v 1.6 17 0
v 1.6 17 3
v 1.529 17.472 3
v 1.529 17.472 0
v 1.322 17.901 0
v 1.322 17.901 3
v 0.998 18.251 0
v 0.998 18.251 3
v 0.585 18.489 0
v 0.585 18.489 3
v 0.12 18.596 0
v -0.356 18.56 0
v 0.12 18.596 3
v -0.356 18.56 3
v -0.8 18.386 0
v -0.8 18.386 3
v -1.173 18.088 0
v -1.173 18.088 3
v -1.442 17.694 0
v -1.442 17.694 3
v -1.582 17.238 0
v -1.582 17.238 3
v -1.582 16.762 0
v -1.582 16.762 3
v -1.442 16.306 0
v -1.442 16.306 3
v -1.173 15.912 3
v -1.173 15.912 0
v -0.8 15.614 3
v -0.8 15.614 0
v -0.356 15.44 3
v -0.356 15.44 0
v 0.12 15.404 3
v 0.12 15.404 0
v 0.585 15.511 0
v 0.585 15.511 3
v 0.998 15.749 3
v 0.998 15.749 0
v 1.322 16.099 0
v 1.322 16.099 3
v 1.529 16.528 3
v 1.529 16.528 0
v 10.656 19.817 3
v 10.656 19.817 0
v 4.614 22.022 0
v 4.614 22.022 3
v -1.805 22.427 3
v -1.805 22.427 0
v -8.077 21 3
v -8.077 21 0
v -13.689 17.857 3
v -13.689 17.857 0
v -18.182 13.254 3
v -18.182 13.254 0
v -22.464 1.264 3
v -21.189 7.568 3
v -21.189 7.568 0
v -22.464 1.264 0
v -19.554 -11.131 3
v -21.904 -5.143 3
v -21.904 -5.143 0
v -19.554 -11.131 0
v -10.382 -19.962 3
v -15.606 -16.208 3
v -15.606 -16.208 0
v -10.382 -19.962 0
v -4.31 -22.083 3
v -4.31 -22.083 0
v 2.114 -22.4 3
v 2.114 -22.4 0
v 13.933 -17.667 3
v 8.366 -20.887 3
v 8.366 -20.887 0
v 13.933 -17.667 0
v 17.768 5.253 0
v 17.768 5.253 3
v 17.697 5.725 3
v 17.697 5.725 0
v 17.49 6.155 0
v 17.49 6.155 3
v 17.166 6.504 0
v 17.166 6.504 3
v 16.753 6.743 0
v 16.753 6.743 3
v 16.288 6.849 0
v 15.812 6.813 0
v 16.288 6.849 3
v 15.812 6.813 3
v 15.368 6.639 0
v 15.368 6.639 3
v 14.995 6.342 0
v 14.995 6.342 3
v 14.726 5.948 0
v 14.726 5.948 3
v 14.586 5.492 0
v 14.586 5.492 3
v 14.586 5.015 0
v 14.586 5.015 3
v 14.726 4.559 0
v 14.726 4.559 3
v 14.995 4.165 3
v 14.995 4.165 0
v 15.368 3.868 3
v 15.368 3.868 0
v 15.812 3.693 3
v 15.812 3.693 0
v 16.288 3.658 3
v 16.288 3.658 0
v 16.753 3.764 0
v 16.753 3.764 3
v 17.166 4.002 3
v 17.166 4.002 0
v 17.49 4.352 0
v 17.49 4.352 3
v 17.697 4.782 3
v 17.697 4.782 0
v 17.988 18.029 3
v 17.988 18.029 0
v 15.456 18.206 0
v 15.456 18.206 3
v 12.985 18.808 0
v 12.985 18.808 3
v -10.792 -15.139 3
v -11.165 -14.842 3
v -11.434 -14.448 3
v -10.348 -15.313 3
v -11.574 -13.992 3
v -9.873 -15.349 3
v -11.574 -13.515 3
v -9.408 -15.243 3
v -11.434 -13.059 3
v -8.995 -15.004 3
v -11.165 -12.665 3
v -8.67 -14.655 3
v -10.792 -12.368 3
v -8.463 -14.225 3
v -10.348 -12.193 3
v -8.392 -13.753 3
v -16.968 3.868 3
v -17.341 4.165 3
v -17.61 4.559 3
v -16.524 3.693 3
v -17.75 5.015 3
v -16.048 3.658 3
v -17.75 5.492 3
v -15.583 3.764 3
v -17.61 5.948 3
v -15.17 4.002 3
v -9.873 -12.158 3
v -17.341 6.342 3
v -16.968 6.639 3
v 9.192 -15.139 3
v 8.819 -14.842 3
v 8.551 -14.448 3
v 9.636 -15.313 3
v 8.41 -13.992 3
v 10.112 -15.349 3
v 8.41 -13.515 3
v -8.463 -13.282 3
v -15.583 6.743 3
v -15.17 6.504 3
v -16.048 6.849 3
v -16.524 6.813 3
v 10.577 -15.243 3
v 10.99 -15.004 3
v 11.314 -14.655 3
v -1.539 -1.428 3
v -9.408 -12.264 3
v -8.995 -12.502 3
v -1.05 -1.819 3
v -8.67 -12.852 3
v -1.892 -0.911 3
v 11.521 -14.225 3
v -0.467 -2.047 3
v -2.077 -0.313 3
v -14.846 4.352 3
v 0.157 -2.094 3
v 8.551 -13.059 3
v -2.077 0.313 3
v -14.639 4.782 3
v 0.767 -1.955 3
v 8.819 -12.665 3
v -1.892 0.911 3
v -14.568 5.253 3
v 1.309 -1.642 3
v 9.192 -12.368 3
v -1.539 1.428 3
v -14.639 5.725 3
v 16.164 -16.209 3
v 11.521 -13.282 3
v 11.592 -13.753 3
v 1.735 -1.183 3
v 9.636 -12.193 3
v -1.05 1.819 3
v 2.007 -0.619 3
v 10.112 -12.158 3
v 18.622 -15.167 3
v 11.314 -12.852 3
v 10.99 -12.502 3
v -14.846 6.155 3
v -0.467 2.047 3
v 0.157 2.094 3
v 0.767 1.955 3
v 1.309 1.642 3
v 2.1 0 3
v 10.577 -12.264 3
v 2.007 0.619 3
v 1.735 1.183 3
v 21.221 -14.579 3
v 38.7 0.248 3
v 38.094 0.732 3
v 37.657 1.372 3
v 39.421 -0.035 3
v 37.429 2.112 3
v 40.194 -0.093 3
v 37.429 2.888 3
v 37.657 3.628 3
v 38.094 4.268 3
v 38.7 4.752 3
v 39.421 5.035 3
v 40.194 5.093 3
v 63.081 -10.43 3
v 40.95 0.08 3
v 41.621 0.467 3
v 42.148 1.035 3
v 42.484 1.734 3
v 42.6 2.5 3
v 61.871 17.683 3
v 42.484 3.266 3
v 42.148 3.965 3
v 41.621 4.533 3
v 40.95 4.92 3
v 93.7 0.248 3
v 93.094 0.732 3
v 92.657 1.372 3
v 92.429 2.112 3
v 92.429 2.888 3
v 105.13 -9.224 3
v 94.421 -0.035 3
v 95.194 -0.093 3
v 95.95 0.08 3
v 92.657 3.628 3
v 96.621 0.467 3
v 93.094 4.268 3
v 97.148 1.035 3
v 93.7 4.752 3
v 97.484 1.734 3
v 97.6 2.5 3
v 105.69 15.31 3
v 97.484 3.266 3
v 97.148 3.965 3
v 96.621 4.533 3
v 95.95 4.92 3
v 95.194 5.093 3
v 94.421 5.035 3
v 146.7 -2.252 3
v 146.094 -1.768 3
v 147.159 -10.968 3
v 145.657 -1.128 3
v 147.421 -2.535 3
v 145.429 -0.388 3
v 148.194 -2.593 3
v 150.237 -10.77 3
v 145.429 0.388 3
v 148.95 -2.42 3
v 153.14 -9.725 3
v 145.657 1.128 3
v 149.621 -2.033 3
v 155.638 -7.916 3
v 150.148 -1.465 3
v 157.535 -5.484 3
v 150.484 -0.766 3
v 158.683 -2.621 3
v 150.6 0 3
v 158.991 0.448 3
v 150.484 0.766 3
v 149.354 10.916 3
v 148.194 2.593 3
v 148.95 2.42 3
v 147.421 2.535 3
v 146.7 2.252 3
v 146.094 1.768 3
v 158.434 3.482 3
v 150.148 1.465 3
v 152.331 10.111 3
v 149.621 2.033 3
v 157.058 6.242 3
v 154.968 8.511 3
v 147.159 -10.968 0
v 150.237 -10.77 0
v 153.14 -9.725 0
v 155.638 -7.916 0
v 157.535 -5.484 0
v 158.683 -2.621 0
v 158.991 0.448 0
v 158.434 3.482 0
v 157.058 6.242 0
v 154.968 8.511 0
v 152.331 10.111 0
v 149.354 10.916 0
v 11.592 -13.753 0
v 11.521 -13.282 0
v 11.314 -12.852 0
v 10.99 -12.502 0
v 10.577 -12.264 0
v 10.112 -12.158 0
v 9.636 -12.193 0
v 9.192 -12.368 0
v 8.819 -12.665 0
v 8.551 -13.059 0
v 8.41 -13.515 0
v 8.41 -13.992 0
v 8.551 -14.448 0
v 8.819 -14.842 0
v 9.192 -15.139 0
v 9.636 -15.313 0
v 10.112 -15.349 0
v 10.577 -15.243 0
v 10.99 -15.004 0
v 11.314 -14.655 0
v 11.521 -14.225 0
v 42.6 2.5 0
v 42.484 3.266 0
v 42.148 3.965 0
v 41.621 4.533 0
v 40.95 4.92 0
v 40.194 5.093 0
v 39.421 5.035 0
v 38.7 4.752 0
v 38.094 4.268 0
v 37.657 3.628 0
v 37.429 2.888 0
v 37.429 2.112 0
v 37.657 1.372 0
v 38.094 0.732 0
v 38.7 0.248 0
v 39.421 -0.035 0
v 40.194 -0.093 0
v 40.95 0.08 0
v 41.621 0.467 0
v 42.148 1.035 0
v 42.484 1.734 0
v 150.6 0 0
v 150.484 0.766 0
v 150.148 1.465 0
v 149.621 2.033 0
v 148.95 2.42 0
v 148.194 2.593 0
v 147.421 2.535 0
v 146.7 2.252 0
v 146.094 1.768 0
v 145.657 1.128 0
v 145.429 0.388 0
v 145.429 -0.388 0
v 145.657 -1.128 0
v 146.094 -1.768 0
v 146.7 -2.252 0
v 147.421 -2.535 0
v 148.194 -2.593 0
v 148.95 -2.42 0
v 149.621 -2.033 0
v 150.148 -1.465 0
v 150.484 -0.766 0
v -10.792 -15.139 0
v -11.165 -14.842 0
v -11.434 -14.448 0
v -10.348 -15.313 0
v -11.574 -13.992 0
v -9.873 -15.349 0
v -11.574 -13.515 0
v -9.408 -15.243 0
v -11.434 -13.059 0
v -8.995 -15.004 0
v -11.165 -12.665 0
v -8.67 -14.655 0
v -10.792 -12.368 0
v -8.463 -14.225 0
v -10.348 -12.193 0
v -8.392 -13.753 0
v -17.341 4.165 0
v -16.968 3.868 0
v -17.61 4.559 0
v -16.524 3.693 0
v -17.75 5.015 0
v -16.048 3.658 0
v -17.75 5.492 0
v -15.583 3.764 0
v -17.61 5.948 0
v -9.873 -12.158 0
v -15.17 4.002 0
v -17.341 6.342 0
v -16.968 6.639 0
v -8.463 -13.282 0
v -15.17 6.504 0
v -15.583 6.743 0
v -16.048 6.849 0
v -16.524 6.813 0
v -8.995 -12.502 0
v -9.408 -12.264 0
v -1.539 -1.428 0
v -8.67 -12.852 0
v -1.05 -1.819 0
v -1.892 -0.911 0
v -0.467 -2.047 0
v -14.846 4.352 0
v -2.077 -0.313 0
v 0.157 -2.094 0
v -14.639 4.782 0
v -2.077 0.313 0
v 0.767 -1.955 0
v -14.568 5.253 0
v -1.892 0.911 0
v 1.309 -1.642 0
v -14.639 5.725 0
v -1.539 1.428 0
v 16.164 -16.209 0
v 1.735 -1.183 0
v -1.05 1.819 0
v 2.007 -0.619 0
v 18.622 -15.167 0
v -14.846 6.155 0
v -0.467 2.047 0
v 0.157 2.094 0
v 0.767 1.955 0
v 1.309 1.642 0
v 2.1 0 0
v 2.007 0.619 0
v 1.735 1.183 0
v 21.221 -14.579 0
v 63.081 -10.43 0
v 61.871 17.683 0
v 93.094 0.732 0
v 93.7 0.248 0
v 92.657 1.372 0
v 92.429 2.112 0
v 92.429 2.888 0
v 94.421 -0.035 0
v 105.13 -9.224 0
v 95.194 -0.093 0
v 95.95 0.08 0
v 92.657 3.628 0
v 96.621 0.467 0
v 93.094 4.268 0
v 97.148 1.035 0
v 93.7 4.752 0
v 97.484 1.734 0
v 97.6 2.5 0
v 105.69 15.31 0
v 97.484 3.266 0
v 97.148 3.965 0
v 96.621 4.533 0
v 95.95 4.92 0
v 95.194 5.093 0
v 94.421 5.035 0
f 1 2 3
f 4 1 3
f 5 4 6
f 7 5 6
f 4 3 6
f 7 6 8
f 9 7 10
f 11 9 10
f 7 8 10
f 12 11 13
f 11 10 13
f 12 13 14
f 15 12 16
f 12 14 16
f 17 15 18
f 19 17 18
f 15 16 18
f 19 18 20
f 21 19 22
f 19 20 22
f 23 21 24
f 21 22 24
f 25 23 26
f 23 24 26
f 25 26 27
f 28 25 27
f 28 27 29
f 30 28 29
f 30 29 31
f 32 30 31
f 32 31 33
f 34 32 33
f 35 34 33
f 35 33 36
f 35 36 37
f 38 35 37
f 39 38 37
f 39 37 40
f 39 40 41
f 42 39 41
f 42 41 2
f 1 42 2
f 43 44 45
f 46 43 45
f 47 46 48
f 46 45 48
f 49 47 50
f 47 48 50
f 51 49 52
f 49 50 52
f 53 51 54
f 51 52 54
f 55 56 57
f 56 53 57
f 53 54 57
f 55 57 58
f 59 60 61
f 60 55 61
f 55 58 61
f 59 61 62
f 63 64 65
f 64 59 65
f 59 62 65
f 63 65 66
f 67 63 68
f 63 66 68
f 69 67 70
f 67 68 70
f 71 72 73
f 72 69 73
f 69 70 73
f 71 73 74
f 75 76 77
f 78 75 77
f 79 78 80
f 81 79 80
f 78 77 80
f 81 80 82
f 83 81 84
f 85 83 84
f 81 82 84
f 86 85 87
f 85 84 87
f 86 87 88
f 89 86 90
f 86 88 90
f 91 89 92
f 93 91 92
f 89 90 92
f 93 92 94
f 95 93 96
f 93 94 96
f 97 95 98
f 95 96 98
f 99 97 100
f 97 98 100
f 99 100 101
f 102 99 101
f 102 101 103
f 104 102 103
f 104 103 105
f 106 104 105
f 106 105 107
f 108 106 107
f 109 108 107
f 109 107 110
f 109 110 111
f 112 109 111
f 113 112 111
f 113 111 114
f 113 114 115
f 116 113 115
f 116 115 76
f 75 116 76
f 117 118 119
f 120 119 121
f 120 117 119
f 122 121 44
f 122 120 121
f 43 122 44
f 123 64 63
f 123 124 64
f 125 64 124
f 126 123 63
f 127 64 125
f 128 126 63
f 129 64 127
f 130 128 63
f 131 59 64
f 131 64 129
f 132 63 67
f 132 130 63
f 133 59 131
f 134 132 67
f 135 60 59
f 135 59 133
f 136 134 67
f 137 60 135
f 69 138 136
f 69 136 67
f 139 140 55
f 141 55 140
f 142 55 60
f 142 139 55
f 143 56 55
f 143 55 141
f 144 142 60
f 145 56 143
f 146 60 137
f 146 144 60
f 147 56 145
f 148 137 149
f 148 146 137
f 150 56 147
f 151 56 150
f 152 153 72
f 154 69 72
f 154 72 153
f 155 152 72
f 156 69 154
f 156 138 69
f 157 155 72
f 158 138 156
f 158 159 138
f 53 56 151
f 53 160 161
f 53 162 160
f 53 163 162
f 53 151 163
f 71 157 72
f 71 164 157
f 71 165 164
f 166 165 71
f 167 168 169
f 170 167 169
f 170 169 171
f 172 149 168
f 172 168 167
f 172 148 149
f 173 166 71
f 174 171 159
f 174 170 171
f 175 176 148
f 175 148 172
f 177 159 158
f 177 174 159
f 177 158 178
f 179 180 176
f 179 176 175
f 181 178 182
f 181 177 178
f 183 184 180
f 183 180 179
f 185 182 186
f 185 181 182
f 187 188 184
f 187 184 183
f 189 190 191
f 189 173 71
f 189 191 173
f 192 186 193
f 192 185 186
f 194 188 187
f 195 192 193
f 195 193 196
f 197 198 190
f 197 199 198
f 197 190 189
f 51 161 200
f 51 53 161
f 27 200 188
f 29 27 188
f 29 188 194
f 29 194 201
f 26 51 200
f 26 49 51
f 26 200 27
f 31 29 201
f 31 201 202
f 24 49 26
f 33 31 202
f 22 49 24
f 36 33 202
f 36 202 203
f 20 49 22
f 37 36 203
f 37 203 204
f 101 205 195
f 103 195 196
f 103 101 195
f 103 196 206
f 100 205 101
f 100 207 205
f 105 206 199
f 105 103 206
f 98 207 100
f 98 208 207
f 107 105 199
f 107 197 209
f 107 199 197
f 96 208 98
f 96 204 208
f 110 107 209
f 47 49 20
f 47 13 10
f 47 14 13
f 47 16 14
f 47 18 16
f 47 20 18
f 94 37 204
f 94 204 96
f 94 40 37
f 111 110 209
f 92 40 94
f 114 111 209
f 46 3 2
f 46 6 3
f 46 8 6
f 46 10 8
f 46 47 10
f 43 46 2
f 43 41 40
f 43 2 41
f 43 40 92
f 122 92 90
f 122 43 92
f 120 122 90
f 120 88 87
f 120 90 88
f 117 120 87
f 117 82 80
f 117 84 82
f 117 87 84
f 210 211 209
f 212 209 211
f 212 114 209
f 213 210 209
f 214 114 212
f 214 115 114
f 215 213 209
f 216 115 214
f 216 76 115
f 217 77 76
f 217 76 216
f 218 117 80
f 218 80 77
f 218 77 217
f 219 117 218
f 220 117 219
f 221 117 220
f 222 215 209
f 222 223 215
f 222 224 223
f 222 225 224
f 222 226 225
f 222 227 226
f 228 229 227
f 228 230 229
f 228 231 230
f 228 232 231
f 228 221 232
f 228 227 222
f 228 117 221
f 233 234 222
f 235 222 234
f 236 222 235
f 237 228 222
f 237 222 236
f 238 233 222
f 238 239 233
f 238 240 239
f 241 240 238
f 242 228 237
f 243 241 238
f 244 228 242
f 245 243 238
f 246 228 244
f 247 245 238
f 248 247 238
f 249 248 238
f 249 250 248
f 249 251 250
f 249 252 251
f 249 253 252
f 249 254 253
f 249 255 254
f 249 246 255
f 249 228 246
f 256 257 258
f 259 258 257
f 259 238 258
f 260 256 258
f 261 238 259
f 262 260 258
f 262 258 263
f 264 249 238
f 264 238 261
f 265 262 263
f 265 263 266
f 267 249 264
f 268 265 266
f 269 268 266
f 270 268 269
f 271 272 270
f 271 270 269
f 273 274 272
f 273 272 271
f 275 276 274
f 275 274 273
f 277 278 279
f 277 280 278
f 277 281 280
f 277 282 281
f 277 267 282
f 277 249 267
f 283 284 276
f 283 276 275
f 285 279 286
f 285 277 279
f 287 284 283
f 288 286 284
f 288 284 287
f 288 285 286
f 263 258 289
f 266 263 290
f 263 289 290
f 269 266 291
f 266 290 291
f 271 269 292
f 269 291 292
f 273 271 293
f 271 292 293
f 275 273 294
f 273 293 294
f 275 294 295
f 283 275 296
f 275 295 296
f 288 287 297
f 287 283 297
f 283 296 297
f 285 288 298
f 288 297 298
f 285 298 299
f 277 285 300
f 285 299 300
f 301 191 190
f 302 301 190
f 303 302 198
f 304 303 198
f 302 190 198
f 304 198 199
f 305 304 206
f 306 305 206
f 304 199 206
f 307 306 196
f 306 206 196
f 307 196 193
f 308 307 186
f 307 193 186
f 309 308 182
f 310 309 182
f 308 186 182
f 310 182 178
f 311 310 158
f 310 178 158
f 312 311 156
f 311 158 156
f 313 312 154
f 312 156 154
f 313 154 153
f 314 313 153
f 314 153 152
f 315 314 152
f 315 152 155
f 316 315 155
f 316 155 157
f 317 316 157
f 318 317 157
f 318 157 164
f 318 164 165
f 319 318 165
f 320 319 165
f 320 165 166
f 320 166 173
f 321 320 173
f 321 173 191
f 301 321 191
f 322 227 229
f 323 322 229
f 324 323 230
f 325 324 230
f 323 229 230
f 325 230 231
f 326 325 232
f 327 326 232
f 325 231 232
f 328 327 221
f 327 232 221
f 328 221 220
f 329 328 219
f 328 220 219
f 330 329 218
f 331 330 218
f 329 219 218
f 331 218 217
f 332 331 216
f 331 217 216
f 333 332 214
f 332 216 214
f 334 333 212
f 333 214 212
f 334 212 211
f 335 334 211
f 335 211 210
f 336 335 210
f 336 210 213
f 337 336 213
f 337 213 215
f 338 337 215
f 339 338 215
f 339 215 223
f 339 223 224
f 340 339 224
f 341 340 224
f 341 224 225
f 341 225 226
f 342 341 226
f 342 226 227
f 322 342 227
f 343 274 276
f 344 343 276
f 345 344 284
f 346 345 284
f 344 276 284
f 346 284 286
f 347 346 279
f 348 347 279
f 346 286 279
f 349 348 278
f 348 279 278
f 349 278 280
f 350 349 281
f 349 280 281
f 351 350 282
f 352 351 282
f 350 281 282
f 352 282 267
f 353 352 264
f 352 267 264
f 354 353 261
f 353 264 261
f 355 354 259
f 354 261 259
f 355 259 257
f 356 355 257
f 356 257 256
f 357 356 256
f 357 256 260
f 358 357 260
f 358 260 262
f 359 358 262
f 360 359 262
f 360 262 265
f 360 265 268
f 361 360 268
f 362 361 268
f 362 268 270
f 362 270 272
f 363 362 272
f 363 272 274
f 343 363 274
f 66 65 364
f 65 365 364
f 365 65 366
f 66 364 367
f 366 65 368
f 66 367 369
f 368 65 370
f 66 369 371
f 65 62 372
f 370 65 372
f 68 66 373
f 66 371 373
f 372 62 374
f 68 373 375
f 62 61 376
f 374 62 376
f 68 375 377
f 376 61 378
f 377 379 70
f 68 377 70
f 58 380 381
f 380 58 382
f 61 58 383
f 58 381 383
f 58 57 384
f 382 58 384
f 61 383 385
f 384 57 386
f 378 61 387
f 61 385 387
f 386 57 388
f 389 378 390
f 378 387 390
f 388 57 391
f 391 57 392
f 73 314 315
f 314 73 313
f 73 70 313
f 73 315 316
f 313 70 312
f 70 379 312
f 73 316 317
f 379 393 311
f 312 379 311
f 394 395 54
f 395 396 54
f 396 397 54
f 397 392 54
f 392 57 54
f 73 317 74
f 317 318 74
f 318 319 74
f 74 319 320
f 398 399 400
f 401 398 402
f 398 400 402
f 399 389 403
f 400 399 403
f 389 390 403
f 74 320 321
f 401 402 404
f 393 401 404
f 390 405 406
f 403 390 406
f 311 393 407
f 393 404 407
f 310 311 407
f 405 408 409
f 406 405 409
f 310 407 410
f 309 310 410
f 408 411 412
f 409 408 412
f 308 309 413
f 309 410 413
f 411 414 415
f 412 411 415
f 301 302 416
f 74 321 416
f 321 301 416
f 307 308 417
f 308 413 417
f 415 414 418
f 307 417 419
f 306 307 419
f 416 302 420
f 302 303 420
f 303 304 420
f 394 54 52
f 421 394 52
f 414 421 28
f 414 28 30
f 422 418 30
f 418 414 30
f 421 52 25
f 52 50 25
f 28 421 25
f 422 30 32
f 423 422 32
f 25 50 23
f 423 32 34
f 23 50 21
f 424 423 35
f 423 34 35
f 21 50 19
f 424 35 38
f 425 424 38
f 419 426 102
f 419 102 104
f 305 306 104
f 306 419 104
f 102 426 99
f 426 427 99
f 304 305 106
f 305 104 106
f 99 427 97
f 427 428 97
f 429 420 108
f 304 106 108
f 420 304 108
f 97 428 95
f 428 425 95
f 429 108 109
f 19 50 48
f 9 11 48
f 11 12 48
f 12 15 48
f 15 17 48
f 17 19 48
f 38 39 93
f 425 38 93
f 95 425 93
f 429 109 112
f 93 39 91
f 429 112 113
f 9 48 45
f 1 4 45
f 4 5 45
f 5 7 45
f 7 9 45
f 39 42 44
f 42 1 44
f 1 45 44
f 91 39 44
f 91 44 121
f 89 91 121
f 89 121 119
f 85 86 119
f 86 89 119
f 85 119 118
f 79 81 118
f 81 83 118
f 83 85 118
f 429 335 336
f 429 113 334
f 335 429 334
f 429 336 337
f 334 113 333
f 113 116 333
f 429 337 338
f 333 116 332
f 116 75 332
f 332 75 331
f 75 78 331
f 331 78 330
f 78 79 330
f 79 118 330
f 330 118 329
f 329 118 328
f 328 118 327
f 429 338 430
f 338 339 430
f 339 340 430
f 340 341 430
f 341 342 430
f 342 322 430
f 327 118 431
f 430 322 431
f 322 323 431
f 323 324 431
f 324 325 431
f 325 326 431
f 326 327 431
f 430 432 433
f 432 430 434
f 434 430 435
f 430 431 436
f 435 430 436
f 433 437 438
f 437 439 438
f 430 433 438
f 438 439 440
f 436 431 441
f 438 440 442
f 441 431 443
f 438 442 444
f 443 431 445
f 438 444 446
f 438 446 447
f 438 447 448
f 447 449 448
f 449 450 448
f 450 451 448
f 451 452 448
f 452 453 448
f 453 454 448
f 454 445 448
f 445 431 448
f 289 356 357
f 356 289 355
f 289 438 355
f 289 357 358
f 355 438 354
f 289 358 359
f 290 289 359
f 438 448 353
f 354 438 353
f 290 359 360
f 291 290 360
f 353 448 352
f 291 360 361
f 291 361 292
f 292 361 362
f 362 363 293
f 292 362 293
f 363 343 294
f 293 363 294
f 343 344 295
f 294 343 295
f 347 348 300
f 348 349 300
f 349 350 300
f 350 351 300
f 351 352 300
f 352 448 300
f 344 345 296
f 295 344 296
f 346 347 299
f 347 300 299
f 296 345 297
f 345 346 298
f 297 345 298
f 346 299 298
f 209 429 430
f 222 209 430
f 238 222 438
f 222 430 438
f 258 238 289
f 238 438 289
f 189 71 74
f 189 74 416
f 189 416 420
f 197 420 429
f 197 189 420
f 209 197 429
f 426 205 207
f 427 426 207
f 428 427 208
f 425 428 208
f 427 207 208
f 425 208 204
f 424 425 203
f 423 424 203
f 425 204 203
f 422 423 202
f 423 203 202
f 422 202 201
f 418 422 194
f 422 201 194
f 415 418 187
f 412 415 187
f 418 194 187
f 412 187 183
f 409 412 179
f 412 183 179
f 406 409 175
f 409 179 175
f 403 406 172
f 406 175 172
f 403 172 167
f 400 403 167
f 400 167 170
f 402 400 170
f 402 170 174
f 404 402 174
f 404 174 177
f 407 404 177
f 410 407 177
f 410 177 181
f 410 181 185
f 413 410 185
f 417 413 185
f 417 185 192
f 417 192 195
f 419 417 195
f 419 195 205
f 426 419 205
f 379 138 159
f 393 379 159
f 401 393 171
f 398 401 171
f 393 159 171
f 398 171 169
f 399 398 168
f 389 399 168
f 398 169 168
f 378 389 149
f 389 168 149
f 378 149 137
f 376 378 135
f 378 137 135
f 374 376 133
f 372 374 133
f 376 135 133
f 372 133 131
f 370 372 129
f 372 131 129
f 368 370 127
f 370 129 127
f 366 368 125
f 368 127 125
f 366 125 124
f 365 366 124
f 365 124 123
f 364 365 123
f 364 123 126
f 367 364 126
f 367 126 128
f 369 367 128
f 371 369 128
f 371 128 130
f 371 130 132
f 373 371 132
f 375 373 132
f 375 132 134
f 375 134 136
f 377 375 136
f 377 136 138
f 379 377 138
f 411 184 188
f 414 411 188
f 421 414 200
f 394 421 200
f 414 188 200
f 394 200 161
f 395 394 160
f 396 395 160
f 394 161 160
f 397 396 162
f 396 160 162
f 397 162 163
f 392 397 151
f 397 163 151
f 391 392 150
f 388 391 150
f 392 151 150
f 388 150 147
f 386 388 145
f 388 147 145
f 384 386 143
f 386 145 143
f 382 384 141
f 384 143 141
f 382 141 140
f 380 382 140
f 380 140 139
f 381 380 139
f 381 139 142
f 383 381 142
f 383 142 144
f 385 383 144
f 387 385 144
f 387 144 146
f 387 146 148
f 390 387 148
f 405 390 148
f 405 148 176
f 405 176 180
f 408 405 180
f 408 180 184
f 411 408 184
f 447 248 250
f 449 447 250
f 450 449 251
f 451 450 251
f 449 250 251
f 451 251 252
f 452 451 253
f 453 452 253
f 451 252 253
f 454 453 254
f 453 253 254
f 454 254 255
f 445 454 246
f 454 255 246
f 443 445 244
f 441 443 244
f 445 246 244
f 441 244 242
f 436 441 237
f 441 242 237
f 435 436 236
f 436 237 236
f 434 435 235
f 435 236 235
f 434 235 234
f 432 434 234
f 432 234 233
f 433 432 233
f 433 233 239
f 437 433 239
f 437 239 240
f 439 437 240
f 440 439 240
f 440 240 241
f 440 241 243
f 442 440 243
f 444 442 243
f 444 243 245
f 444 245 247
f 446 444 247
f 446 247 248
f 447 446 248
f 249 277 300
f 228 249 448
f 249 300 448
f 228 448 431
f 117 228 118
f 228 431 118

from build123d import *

# Parameters (mm, degrees)
BOSS_EXTRUDE1_START     = -5
BOSS_EXTRUDE1_OUTLINE_R = 1.925
BOSS_EXTRUDE1_DEPTH     = 5
SKETCH4_R               = 1.6
CUT_EXTRUDE2_DEPTH      = 161.661912101
FILLET1_R               = 15
SKETCH5_R               = 2.1
SKETCH5_R_2             = 2.6
CUT_EXTRUDE4_DEPTH      = 161.661912218
SKETCH6_W               = 233.09675901
SKETCH6_H               = 87.107773224
CUT_EXTRUDE5_DEPTH      = 2


with BuildPart() as part:
    # Boss-Extrude1: read off the stored shape, not the designer's step
    # Boss-Extrude1 outline → Boss-Extrude1 (new body)
    with BuildSketch(Plane.XY.offset(5).offset(BOSS_EXTRUDE1_START)):
        with BuildLine():
            ThreePointArc((149.353851183, 10.916367847), (81.584978704, 16.866619507), (13.564040933, 17.951790818))
            ThreePointArc((13.564040933, 17.951790818), (-22.408339146, -2.028875729), (16.567779435, -15.223622585))
            ThreePointArc((16.567779435, -15.223622585), (81.747231754, -9.530296146), (147.159069574, -10.96780908))
            ThreePointArc((147.159069574, -10.96780908), (158.945093507, -1.097692183), (149.353851183, 10.916367847))
        make_face()
        with Locations((40, 2.5)):
            Circle(BOSS_EXTRUDE1_OUTLINE_R, mode=Mode.SUBTRACT)
        with Locations((95, 2.5)):
            Circle(BOSS_EXTRUDE1_OUTLINE_R, mode=Mode.SUBTRACT)
    extrude(amount=BOSS_EXTRUDE1_DEPTH)

    # Sketch4 → Cut-Extrude2 (cut, through all)
    with BuildSketch(Plane.XY.offset(5)):
        with Locations((0, 17)):
            Circle(SKETCH4_R)
        with Locations((16.167960777, 5.253288904)):
            Circle(SKETCH4_R)
        with Locations((9.992349289, -13.753288904)):
            Circle(SKETCH4_R)
        with Locations((-9.992349289, -13.753288904)):
            Circle(SKETCH4_R)
        with Locations((-16.167960777, 5.253288904)):
            Circle(SKETCH4_R)
    extrude(amount=-CUT_EXTRUDE2_DEPTH, mode=Mode.SUBTRACT)

    # Fillet1
    fillet1_edges = [part.edges().sort_by_distance(p)[0] for p in [
        (16.567779435, -15.223622585, 2.5),
        (13.564040933, 17.951790818, 2.5),
    ]]
    fillet(fillet1_edges, radius=FILLET1_R)

    # Sketch5 → Cut-Extrude4 (cut, through all)
    with BuildSketch(Plane.XY.offset(5)):
        Circle(SKETCH5_R)
        with Locations((148, 0)):
            Circle(SKETCH5_R_2)
        with Locations((95, 2.5)):
            Circle(SKETCH5_R_2)
        with Locations((40, 2.5)):
            Circle(SKETCH5_R_2)
    extrude(amount=-CUT_EXTRUDE4_DEPTH, mode=Mode.SUBTRACT)

    # Sketch6 → Cut-Extrude5 (cut)
    with BuildSketch(Plane.XY.offset(5)):
        with Locations((68.481602645, 0)):
            Rectangle(SKETCH6_W, SKETCH6_H)
    extrude(amount=-CUT_EXTRUDE5_DEPTH, mode=Mode.SUBTRACT)


solid = part.part
